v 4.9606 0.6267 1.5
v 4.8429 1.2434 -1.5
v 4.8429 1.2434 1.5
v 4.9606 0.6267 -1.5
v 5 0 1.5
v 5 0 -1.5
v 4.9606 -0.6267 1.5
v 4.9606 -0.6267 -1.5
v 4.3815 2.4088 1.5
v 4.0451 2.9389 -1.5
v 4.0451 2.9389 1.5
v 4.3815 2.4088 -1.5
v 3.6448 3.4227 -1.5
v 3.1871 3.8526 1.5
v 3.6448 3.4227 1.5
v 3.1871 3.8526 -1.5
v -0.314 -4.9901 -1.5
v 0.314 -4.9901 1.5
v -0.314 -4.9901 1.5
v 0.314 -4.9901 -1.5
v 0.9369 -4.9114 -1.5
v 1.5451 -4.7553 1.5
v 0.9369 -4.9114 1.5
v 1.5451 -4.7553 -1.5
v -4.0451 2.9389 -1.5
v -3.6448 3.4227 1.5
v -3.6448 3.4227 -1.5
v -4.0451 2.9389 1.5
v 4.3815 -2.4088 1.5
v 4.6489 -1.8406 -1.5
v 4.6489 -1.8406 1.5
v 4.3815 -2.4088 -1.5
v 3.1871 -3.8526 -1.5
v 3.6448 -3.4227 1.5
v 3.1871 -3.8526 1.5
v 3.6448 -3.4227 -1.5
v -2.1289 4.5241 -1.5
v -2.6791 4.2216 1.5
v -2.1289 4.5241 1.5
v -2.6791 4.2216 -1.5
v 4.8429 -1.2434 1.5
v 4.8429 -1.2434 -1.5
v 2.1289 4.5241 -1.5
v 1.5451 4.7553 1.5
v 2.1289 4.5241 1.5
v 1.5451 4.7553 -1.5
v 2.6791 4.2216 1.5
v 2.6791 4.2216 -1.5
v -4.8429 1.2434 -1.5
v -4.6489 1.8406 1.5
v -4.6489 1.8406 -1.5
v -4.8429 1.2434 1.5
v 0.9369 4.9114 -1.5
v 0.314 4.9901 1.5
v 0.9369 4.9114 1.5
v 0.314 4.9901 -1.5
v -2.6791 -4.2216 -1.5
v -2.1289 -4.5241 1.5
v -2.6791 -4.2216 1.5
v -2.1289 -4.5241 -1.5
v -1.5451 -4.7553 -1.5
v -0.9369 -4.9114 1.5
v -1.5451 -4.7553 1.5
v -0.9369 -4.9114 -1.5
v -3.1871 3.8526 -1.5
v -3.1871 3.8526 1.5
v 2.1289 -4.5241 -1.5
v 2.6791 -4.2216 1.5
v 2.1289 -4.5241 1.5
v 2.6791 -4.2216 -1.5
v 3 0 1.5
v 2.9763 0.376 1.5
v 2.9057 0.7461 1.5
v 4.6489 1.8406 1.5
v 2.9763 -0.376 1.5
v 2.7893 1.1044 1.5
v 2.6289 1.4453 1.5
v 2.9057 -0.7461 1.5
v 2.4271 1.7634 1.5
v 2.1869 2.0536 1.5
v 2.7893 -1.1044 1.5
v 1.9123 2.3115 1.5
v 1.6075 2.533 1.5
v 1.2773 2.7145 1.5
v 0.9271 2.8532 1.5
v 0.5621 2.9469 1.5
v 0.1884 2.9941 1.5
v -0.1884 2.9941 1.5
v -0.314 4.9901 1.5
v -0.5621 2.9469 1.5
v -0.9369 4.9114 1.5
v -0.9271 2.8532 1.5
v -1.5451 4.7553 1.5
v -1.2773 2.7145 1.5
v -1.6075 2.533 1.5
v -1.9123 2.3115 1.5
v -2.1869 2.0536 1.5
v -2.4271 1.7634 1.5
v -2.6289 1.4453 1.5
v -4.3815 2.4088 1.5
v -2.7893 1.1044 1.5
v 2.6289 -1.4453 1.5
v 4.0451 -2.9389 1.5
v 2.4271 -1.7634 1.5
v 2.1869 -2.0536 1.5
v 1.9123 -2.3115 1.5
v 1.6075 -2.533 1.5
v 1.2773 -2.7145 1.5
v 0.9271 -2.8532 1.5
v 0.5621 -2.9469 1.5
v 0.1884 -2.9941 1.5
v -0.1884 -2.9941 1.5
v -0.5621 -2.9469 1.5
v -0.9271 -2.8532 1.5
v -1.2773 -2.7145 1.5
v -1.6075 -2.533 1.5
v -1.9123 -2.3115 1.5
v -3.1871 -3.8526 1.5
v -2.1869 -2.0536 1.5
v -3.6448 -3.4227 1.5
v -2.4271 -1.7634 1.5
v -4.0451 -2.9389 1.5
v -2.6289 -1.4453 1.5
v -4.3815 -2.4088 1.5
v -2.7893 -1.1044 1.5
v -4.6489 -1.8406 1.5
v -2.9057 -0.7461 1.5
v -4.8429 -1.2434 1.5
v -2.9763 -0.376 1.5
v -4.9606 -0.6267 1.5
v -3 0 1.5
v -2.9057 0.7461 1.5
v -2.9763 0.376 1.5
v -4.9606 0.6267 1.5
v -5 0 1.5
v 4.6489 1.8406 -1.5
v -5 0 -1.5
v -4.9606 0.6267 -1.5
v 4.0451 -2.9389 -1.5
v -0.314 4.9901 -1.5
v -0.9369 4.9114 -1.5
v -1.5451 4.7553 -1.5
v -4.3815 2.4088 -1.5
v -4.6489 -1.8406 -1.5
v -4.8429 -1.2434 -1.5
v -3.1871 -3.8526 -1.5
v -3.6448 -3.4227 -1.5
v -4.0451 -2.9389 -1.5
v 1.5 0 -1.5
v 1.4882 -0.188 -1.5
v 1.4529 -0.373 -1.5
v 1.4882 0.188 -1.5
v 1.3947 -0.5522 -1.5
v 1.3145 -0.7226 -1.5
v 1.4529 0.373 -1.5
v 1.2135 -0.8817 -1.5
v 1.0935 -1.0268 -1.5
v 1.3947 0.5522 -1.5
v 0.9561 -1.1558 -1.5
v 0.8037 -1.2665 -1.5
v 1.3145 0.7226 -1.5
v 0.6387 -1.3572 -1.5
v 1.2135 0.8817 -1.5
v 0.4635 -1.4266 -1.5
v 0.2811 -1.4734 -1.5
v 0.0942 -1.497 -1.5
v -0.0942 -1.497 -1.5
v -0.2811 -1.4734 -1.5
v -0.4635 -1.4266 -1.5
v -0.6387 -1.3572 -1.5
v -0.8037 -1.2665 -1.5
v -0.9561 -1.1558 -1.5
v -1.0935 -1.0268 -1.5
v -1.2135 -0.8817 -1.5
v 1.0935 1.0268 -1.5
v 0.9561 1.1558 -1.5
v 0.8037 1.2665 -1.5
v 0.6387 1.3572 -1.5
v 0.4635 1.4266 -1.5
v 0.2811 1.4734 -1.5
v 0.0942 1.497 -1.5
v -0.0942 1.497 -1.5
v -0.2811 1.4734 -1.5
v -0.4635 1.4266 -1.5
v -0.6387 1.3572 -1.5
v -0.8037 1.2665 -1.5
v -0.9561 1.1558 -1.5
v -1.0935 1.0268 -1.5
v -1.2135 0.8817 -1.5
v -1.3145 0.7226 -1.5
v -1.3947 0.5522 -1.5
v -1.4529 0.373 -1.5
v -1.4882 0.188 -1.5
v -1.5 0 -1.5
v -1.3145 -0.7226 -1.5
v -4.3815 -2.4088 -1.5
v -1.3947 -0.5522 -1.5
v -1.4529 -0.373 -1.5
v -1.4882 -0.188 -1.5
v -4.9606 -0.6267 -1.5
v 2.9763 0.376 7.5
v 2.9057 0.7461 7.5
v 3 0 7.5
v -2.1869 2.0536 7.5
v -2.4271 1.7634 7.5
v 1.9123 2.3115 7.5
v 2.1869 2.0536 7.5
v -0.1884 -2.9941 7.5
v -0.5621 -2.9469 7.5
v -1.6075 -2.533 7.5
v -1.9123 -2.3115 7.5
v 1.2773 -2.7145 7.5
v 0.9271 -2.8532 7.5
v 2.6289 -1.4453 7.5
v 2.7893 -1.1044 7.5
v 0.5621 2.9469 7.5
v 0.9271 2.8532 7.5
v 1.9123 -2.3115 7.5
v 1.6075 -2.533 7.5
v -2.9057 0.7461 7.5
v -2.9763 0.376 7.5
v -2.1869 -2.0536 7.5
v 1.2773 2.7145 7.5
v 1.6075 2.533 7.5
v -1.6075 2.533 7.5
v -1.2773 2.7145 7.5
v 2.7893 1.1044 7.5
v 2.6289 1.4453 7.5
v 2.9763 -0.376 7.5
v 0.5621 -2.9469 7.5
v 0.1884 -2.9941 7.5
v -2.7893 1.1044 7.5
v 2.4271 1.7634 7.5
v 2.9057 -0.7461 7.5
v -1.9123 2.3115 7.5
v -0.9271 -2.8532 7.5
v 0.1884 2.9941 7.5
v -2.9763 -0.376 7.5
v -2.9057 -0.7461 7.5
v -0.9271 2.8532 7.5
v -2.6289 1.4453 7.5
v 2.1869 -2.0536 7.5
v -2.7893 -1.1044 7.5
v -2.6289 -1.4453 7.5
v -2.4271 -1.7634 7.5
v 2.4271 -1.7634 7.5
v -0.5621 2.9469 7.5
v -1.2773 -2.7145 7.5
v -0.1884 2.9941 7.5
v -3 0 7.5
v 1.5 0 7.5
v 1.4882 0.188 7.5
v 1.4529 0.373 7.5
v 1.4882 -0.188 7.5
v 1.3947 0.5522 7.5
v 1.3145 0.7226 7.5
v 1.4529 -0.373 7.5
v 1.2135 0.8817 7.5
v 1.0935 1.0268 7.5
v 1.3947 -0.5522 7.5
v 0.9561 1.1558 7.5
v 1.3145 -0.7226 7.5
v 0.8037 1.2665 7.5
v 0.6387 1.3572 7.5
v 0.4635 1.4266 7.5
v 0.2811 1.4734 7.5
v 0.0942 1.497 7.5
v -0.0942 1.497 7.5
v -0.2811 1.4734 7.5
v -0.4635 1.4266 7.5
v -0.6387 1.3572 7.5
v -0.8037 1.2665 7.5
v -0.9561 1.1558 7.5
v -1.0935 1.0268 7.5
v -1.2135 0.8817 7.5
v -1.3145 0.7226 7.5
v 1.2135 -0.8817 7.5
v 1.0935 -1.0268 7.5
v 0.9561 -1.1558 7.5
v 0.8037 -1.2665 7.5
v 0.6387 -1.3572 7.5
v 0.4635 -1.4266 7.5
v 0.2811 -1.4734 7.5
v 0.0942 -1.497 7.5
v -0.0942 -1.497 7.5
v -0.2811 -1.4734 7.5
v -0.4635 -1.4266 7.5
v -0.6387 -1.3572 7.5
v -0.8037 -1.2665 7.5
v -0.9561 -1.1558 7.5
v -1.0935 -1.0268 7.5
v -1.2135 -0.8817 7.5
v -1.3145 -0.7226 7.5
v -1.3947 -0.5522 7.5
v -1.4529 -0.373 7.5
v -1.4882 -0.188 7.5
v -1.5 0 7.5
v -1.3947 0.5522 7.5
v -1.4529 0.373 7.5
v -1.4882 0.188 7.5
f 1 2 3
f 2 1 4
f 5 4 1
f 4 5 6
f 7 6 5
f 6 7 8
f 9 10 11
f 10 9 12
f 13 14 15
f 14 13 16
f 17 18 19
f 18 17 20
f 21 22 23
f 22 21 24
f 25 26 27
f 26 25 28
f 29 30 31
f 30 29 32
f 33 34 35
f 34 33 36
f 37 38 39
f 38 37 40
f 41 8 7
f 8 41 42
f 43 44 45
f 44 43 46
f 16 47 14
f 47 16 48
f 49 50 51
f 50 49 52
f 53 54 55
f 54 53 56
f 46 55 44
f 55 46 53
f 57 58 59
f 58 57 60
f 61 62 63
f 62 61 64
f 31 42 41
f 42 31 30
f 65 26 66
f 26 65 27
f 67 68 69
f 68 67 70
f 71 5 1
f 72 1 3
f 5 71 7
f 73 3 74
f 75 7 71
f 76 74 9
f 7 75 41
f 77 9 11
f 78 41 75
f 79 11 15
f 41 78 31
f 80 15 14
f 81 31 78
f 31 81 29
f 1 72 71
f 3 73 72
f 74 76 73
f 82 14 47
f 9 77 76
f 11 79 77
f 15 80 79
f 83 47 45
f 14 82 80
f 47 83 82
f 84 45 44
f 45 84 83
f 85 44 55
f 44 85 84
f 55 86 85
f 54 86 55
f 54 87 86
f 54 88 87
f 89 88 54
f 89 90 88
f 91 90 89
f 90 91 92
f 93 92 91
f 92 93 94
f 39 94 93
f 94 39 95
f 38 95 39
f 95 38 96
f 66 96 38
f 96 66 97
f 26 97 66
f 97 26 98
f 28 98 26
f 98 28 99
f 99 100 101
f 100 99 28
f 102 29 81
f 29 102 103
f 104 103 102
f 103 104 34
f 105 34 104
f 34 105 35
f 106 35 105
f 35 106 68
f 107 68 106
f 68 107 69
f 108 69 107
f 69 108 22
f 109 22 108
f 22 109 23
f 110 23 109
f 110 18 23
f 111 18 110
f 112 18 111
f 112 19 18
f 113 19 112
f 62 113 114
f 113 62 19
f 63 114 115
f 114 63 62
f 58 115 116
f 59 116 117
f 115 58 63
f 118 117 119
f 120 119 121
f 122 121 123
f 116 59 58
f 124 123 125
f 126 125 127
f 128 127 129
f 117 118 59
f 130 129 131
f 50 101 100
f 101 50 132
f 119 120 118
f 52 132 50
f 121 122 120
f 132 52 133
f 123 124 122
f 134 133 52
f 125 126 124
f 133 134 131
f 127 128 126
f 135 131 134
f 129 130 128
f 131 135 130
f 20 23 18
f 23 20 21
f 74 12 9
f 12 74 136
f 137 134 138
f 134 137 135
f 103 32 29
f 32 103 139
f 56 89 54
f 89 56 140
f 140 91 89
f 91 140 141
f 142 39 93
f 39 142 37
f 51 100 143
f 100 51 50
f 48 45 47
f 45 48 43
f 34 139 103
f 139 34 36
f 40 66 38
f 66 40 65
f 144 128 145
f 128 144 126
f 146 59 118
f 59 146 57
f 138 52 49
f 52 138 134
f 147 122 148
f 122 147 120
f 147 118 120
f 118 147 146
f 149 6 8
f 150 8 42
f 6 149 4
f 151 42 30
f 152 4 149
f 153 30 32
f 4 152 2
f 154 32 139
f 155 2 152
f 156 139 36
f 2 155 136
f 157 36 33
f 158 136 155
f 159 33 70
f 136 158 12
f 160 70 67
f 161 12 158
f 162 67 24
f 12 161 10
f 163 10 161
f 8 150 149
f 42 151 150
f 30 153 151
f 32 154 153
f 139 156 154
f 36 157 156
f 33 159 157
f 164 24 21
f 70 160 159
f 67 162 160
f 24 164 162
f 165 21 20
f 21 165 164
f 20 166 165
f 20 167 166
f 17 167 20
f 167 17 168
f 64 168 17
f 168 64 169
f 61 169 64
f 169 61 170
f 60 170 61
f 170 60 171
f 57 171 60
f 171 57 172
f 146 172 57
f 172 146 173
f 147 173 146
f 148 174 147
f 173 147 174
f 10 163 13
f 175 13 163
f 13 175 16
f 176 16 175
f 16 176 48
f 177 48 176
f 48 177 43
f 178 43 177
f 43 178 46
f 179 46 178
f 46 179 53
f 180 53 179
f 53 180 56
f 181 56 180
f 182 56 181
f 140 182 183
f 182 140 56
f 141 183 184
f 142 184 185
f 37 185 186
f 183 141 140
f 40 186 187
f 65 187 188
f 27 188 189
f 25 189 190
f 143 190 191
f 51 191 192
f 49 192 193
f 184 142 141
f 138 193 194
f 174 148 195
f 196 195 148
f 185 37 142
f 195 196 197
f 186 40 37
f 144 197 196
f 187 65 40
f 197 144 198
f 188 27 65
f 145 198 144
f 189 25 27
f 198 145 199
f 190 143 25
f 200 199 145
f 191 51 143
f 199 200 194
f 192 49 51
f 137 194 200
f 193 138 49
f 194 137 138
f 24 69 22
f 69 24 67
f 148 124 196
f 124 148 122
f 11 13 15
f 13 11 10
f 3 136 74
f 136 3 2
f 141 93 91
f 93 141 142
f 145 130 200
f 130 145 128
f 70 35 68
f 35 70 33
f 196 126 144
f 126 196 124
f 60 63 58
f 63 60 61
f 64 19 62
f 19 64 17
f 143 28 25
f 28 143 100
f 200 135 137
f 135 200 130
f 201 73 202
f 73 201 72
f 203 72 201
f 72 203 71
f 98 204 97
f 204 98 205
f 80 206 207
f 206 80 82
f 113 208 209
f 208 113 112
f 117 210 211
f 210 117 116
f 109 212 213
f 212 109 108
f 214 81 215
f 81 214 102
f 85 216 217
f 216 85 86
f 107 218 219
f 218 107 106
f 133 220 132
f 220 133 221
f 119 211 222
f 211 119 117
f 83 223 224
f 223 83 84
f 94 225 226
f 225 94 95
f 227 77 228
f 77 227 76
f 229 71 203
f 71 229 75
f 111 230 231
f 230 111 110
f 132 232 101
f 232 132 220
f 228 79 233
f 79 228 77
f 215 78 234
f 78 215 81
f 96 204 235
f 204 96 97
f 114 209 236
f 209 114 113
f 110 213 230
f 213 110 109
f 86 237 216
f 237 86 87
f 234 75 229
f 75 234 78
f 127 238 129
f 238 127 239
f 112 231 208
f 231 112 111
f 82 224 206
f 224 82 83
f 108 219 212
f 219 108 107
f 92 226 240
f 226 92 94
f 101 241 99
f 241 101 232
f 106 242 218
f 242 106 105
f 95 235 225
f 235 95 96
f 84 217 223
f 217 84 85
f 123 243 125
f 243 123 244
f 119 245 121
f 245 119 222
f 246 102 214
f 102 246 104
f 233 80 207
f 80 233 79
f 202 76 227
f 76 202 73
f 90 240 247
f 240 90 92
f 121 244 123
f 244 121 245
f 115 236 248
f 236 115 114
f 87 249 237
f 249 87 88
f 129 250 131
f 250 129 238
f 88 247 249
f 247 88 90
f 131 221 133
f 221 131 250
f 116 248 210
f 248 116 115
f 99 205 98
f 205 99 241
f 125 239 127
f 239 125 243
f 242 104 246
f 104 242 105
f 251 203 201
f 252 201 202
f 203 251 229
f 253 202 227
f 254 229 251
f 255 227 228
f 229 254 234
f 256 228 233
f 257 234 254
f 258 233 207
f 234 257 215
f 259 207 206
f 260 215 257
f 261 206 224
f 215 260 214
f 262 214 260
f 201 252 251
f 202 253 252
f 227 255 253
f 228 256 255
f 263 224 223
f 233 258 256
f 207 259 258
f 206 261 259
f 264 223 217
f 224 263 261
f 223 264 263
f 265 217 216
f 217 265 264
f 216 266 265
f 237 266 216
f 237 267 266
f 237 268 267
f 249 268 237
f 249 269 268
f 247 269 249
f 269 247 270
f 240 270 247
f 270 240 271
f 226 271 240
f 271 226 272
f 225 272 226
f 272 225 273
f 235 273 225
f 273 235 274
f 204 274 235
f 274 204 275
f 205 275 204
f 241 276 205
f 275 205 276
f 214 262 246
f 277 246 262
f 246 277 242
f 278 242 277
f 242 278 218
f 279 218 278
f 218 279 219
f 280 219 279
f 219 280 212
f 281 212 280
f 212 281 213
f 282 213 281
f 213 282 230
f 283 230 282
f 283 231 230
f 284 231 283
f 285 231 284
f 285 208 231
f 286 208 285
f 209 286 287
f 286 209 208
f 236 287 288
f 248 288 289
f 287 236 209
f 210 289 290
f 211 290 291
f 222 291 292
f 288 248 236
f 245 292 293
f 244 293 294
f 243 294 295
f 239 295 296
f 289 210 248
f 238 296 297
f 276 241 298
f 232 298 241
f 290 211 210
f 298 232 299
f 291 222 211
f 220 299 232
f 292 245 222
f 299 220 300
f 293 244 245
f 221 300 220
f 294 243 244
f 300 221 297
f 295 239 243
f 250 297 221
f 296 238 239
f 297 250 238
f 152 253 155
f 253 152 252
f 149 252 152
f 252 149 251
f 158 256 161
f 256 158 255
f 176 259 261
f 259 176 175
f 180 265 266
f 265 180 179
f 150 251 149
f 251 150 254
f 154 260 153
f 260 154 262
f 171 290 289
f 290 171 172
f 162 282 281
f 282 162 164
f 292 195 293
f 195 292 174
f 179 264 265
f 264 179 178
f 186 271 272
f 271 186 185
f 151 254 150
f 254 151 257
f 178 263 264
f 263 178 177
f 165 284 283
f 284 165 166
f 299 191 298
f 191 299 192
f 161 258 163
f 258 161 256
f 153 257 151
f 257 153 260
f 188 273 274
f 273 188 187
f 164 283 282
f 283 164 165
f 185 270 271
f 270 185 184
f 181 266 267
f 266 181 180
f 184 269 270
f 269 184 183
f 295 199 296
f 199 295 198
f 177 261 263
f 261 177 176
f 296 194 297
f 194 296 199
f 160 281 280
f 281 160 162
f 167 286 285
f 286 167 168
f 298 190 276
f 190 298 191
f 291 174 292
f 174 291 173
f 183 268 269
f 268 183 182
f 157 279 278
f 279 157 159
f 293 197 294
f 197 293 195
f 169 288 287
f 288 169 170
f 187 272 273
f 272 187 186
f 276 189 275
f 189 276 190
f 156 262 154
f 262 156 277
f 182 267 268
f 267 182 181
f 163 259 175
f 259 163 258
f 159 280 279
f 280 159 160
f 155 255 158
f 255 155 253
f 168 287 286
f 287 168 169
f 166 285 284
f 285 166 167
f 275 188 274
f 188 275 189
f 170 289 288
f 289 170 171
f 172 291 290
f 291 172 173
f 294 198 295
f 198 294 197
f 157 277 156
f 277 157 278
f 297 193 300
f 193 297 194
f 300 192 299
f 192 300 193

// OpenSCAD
$fn = 50;


difference() {
	union() {
		translate(v = [0, 0, -1.5000000000]) {
			cylinder(h = 3, r = 5.0000000000);
		}
		translate(v = [0, 0, -1.5000000000]) {
			cylinder(h = 9, r = 3.0000000000);
		}
	}
	union() {
		translate(v = [0, 0, -100.0000000000]) {
			cylinder(h = 200, r = 1.5000000000);
		}
	}
}
